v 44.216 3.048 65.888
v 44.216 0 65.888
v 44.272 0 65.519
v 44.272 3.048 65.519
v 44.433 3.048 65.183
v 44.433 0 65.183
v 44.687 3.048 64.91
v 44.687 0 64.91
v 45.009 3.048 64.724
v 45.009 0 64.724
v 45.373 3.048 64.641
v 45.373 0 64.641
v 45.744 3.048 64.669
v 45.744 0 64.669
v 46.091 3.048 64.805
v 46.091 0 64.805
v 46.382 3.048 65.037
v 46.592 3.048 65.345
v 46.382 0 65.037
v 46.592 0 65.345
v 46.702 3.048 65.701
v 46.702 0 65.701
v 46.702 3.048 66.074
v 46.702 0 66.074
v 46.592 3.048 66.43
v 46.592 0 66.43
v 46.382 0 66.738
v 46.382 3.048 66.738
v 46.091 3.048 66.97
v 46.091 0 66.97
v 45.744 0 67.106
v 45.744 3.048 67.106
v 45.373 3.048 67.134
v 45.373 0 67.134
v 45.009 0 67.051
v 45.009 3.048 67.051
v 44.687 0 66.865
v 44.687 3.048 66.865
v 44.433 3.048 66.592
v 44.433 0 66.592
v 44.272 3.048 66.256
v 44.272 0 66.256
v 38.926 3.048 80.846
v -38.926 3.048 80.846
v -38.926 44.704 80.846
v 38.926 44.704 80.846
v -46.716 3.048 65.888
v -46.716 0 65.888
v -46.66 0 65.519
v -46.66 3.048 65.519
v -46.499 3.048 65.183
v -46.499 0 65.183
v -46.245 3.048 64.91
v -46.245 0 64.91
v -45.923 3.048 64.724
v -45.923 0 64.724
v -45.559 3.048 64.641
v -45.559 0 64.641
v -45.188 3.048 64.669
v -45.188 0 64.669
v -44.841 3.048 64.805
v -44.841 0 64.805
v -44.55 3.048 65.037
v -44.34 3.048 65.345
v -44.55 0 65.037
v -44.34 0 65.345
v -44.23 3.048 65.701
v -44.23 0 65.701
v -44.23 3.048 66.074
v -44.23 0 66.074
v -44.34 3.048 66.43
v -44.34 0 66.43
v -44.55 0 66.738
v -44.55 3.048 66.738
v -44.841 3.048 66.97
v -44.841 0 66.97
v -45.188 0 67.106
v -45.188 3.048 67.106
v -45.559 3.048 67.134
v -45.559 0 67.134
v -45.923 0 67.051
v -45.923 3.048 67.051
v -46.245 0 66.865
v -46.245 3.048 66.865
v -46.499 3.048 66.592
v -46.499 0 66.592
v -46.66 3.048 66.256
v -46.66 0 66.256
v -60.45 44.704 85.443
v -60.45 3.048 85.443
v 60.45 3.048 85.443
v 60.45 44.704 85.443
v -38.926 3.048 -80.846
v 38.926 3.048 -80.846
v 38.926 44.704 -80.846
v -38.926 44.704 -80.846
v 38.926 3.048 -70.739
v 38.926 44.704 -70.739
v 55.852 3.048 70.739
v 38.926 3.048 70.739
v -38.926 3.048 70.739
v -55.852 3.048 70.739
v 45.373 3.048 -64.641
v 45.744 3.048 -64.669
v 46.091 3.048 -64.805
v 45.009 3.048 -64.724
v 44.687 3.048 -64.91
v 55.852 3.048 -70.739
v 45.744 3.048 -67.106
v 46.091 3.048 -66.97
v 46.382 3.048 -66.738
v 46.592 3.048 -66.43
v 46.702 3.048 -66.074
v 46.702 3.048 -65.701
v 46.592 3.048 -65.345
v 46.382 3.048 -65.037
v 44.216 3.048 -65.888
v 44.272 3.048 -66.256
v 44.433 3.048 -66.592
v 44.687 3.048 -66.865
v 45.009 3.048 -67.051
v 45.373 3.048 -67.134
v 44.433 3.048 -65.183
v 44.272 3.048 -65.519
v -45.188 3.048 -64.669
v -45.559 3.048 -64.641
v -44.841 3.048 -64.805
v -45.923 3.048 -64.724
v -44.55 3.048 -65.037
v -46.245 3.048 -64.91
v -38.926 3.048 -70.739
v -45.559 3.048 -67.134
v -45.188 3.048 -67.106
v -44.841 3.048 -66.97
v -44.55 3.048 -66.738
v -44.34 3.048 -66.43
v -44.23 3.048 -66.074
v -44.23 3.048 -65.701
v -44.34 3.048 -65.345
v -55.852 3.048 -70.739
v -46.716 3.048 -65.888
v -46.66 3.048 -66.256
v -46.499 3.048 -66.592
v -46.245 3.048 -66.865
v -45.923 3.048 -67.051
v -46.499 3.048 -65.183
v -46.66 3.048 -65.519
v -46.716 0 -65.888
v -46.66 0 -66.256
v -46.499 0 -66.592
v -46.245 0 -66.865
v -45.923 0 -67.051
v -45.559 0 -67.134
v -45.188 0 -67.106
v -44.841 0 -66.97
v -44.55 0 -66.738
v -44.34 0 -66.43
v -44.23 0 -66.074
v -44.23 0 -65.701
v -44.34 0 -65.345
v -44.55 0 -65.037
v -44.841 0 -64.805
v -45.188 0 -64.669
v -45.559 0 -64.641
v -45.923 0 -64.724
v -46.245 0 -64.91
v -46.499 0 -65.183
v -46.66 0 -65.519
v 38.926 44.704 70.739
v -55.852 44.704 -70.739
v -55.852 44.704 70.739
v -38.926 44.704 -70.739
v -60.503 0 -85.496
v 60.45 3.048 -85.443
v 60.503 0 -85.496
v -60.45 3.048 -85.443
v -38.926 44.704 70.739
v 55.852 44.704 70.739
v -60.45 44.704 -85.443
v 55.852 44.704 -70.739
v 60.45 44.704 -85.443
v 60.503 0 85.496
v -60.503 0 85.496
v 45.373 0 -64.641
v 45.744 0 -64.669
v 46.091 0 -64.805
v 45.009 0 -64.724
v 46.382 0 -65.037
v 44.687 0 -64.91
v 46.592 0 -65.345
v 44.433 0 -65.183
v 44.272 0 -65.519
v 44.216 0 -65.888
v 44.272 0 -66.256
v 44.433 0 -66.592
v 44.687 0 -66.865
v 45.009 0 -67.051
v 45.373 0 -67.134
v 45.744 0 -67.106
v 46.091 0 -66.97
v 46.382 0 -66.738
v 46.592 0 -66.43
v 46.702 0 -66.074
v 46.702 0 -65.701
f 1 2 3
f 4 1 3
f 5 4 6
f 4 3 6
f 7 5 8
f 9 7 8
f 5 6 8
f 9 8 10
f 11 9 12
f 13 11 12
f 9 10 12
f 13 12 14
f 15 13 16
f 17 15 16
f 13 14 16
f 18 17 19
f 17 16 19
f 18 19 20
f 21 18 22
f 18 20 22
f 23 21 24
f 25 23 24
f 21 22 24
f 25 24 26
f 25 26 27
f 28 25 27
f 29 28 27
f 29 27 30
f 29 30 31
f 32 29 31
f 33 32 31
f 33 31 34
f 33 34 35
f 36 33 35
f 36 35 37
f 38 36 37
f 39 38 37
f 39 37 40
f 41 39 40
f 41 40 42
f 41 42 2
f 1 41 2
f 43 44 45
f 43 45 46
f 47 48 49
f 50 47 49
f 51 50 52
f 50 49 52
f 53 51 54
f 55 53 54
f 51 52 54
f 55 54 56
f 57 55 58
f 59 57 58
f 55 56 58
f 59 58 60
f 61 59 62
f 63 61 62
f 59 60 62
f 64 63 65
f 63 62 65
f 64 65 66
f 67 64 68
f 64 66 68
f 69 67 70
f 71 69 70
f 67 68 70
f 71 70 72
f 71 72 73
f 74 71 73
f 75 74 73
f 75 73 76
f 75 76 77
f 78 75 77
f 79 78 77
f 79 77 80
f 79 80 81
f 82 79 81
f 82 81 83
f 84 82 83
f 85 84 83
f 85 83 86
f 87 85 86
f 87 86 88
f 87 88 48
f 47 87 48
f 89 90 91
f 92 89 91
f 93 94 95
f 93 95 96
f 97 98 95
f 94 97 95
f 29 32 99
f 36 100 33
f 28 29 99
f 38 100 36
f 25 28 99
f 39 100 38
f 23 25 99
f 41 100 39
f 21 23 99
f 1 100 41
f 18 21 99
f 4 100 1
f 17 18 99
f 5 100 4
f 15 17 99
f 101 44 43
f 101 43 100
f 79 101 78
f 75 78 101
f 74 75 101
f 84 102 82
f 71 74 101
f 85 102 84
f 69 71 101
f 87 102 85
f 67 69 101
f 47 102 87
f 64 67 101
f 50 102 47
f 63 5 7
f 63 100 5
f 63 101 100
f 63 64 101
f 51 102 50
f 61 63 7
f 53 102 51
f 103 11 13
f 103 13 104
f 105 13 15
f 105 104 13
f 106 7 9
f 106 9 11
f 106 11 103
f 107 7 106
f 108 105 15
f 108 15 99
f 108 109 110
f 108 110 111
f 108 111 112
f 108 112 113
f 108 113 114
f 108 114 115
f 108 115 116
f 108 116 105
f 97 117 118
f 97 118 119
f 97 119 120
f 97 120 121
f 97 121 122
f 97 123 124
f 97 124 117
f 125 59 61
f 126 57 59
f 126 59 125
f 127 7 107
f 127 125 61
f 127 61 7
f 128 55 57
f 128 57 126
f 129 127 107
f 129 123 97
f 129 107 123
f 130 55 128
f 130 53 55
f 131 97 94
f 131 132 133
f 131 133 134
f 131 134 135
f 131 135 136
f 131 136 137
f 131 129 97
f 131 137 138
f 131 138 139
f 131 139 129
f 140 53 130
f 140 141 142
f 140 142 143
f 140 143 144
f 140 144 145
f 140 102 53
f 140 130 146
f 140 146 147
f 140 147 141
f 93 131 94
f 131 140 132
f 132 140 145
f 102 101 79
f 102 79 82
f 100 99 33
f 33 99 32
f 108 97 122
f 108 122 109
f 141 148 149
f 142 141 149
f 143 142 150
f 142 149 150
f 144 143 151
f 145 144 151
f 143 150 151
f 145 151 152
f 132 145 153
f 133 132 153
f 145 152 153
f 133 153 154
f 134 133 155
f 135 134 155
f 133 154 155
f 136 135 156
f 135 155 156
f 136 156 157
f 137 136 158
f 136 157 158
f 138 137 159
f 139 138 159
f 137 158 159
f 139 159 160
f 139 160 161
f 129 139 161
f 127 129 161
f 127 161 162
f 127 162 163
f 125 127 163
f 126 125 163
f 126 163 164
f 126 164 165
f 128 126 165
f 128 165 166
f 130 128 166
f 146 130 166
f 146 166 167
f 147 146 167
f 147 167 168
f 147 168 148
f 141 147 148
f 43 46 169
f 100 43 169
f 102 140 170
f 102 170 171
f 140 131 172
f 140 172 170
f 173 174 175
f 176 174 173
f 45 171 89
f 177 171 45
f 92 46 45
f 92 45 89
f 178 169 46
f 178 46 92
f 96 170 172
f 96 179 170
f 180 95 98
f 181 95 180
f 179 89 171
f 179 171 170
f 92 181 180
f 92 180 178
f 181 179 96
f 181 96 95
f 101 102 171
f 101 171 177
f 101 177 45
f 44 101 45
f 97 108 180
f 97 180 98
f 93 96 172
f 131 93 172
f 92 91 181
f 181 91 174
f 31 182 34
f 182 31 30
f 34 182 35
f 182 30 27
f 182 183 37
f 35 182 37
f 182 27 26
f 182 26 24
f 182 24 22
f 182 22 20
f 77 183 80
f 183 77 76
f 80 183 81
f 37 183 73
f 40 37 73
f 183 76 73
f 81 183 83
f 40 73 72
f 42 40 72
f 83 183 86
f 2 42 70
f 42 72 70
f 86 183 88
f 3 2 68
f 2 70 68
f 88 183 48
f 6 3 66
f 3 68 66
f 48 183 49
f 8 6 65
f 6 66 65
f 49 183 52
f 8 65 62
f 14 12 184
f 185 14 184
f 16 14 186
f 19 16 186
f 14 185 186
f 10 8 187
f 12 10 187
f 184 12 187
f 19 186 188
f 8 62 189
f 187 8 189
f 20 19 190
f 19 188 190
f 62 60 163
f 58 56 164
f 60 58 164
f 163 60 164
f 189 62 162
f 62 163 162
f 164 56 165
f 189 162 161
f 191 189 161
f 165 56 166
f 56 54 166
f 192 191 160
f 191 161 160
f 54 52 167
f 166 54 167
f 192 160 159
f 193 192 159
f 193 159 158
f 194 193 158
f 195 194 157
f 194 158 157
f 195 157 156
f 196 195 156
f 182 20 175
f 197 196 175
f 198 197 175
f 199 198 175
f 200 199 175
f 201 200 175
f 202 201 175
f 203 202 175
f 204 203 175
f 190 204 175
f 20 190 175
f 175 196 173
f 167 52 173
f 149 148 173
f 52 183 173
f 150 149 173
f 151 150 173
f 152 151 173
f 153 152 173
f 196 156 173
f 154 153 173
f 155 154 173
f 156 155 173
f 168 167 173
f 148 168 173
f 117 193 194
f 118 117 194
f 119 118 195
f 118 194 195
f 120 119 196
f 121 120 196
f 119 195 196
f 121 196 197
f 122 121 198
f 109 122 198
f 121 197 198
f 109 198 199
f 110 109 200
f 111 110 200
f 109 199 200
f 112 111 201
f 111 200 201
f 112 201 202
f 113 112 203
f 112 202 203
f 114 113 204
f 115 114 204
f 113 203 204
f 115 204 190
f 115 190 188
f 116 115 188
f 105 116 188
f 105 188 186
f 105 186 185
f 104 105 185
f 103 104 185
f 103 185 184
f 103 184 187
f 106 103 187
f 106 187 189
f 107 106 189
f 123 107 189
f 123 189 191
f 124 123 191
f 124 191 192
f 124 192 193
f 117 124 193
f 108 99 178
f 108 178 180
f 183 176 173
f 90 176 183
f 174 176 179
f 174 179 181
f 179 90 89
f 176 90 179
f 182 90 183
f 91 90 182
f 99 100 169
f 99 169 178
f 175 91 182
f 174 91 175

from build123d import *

# Parameters (mm, degrees)
SKETCH1_W             = 121.0056
SKETCH1_H             = 170.9928
BOSS_EXTRUDE1_DEPTH   = 3.048
BOSS_EXTRUDE1_TAPER   = 1
SKETCH2_W             = 120.899193924
SKETCH2_H             = 170.886393924
BOSS_EXTRUDE2_DEPTH   = 41.656
M3_TAPPED_HOLE1_D     = 2.5
M3_TAPPED_HOLE1_DEPTH = 4.7752
M3_TAPPED_HOLE1_TIP   = 0.751075774


with BuildPart() as part:
    # Sketch1 → Boss-Extrude1 (new body)
    with BuildSketch(Plane(origin=(0, 0, 0), x_dir=(1, 0, 0), z_dir=(0, 1, 0))):
        Rectangle(SKETCH1_W, SKETCH1_H)
    extrude(amount=BOSS_EXTRUDE1_DEPTH, taper=BOSS_EXTRUDE1_TAPER)

    # Sketch2 → Boss-Extrude2 (add)
    with BuildSketch(Plane(origin=(0, 3.048, 0), x_dir=(1, 0, 0), z_dir=(0, 1, 0))):
        Rectangle(SKETCH2_W, SKETCH2_H)
        Polygon((-55.852196962, 70.739), (-55.852196962, -70.739), (-38.9255, -70.739), (-38.9255, -80.845796962), (38.9255, -80.845796962), (38.9255, -70.739), (55.852196962, -70.739), (55.852196962, 70.739), (38.9255, 70.739), (38.9255, 80.845796962), (-38.9255, 80.845796962), (-38.9255, 70.739), align=None, mode=Mode.SUBTRACT)
    extrude(amount=BOSS_EXTRUDE2_DEPTH)

    # M3 Tapped Hole1
    with Locations(Plane(origin=(0, 3.048, 0), x_dir=(1, 0, 0), z_dir=(0, 1, 0))):
        with Locations((-45.466, 65.8876), (45.466, -65.8876), (45.466, 65.8876), (-45.466, -65.8876)):
            Hole(M3_TAPPED_HOLE1_D / 2, depth=M3_TAPPED_HOLE1_DEPTH)
            with Locations((0, 0, -(M3_TAPPED_HOLE1_DEPTH + M3_TAPPED_HOLE1_TIP / 2))):  # 118° drill point
                Cone(0, M3_TAPPED_HOLE1_D / 2, M3_TAPPED_HOLE1_TIP, mode=Mode.SUBTRACT)


solid = part.part
